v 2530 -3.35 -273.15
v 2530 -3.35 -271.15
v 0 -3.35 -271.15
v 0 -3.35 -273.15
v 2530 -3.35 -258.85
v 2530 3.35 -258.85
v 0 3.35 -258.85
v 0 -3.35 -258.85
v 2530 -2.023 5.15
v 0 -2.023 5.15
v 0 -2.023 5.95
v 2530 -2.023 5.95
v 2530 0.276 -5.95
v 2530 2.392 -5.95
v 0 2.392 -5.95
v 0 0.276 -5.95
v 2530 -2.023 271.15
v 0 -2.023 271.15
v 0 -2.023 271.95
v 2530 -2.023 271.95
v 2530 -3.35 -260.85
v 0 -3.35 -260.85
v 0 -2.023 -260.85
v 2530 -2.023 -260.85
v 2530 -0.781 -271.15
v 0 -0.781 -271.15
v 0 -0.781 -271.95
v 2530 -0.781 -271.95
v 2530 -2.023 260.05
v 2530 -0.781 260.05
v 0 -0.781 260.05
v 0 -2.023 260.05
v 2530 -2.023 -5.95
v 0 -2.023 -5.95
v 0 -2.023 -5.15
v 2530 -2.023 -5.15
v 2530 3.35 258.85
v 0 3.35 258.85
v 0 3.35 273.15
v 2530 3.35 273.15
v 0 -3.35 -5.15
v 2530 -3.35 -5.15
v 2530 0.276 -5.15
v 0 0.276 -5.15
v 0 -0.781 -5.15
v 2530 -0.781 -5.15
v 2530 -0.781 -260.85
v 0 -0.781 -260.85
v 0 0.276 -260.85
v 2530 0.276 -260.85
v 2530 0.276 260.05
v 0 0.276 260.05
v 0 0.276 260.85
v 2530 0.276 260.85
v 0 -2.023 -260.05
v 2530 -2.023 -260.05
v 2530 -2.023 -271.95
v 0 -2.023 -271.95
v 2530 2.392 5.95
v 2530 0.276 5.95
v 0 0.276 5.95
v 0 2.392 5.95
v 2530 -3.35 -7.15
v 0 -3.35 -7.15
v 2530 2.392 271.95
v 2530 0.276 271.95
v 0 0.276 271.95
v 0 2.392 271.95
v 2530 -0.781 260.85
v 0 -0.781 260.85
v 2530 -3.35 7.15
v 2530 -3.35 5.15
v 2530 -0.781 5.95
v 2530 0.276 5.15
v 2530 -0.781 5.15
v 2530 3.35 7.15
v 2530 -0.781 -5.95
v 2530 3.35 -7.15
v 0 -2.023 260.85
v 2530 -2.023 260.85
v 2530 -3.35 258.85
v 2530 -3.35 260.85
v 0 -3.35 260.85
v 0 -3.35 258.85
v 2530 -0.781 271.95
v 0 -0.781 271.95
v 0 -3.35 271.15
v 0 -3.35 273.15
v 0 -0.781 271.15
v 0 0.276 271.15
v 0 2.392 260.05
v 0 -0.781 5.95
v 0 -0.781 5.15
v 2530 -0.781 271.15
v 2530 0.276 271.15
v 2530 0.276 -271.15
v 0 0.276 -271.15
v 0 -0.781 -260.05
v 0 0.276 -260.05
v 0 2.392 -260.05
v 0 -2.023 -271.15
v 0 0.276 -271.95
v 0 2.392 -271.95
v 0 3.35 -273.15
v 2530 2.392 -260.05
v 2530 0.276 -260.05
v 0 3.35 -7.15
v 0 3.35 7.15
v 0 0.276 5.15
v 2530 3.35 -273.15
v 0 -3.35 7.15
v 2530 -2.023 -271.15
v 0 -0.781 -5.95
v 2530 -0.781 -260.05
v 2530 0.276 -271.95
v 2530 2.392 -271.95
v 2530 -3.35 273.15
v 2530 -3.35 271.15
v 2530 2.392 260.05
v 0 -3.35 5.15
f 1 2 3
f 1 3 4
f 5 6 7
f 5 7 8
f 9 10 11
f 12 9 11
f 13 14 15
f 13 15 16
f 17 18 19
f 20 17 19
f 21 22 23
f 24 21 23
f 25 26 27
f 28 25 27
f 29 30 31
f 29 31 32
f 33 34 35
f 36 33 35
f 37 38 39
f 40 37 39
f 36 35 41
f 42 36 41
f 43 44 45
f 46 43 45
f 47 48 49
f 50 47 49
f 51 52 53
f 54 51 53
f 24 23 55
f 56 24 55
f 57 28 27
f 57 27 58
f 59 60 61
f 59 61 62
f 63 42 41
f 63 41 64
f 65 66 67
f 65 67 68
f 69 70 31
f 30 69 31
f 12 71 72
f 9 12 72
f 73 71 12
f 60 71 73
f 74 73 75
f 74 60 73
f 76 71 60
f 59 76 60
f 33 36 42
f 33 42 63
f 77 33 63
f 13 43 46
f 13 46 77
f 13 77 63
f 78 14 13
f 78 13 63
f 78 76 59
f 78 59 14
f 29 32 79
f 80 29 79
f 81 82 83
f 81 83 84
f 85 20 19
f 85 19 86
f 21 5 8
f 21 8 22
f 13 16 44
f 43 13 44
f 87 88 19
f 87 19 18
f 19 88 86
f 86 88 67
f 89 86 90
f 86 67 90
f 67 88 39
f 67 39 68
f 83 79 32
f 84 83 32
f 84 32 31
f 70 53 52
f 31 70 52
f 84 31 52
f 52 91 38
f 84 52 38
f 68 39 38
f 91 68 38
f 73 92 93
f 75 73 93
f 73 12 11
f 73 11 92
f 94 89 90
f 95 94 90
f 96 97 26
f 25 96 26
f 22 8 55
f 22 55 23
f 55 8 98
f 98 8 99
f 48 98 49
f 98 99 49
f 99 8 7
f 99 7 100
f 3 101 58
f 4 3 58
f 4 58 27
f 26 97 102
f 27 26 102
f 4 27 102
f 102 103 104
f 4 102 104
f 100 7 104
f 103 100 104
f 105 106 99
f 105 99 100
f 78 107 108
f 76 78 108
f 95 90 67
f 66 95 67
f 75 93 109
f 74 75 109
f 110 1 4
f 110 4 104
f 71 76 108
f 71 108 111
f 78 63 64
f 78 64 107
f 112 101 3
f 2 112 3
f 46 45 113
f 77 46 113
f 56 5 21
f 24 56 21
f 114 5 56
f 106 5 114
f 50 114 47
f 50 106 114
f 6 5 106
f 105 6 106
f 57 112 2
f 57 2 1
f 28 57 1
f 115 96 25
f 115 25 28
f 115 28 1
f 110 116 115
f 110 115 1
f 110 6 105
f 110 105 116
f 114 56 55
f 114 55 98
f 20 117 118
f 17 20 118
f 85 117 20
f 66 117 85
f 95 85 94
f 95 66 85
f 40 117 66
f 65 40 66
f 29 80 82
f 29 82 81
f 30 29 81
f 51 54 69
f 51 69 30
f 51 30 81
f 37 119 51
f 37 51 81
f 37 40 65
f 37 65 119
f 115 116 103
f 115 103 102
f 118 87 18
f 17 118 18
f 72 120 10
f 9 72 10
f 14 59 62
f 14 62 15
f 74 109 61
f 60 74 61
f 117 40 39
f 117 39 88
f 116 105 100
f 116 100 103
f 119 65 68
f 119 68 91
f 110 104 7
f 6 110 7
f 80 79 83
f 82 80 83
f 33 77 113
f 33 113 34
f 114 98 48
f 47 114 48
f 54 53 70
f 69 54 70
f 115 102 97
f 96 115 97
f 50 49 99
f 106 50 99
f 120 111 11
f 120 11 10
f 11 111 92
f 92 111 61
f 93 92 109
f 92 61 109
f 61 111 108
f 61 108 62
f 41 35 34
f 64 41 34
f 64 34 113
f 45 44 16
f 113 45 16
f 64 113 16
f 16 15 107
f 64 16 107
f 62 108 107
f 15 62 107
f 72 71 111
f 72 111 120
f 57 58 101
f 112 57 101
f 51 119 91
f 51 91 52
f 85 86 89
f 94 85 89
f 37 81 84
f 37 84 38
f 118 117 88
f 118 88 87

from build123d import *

# Parameters (mm, degrees)
BOSS_EXTRUDE1_DEPTH = 2530


with BuildPart() as part:
    # Sketch1 → Boss-Extrude1 (new body)
    with BuildSketch(Plane(origin=(0, 0, 0), x_dir=(0, 0, -1), z_dir=(1, 0, 0))):
        Polygon((-260.85, 0), (-258.85, 0), (-258.85, 3.35), (-273.15, 3.35), (-273.15, -3.35), (-271.15, -3.35), (-271.15, -2.023201375), (-271.95, -2.023201375), (-271.95, -0.781470196), (-271.15, -0.781470196), (-271.15, 0.276300808), (-271.95, 0.276300808), (-271.95, 2.391842816), (-260.05, 2.391842816), (-260.05, 0.276300808), (-260.85, 0.276300808), align=None)
        Polygon((-7.15, 0), (-5.15, 0), (-5.15, 0.276300808), (-5.95, 0.276300808), (-5.95, 2.391842816), (5.95, 2.391842816), (5.95, 0.276300808), (5.15, 0.276300808), (5.15, 0), (7.15, 0), (7.15, 3.35), (-7.15, 3.35), align=None)
        Polygon((7.15, 0), (5.15, 0), (5.15, -0.781470196), (5.95, -0.781470196), (5.95, -2.023201375), (5.15, -2.023201375), (5.15, -3.35), (7.15, -3.35), align=None)
        Polygon((-5.15, -0.781470196), (-5.15, 0), (-7.15, 0), (-7.15, -3.35), (-5.15, -3.35), (-5.15, -2.023201375), (-5.95, -2.023201375), (-5.95, -0.781470196), align=None)
        Polygon((258.85, 3.35), (258.85, 0), (260.85, 0), (260.85, 0.276300808), (260.05, 0.276300808), (260.05, 2.391842816), (271.95, 2.391842816), (271.95, 0.276300808), (271.15, 0.276300808), (271.15, -0.781470196), (271.95, -0.781470196), (271.95, -2.023201375), (271.15, -2.023201375), (271.15, -3.35), (273.15, -3.35), (273.15, 3.35), align=None)
        Polygon((260.85, 0), (258.85, 0), (258.85, -3.35), (260.85, -3.35), (260.85, -2.023201375), (260.05, -2.023201375), (260.05, -0.781470196), (260.85, -0.781470196), align=None)
        Polygon((-258.85, -3.35), (-258.85, 0), (-260.85, 0), (-260.85, -0.781470196), (-260.05, -0.781470196), (-260.05, -2.023201375), (-260.85, -2.023201375), (-260.85, -3.35), align=None)
    extrude(amount=BOSS_EXTRUDE1_DEPTH)


solid = part.part
